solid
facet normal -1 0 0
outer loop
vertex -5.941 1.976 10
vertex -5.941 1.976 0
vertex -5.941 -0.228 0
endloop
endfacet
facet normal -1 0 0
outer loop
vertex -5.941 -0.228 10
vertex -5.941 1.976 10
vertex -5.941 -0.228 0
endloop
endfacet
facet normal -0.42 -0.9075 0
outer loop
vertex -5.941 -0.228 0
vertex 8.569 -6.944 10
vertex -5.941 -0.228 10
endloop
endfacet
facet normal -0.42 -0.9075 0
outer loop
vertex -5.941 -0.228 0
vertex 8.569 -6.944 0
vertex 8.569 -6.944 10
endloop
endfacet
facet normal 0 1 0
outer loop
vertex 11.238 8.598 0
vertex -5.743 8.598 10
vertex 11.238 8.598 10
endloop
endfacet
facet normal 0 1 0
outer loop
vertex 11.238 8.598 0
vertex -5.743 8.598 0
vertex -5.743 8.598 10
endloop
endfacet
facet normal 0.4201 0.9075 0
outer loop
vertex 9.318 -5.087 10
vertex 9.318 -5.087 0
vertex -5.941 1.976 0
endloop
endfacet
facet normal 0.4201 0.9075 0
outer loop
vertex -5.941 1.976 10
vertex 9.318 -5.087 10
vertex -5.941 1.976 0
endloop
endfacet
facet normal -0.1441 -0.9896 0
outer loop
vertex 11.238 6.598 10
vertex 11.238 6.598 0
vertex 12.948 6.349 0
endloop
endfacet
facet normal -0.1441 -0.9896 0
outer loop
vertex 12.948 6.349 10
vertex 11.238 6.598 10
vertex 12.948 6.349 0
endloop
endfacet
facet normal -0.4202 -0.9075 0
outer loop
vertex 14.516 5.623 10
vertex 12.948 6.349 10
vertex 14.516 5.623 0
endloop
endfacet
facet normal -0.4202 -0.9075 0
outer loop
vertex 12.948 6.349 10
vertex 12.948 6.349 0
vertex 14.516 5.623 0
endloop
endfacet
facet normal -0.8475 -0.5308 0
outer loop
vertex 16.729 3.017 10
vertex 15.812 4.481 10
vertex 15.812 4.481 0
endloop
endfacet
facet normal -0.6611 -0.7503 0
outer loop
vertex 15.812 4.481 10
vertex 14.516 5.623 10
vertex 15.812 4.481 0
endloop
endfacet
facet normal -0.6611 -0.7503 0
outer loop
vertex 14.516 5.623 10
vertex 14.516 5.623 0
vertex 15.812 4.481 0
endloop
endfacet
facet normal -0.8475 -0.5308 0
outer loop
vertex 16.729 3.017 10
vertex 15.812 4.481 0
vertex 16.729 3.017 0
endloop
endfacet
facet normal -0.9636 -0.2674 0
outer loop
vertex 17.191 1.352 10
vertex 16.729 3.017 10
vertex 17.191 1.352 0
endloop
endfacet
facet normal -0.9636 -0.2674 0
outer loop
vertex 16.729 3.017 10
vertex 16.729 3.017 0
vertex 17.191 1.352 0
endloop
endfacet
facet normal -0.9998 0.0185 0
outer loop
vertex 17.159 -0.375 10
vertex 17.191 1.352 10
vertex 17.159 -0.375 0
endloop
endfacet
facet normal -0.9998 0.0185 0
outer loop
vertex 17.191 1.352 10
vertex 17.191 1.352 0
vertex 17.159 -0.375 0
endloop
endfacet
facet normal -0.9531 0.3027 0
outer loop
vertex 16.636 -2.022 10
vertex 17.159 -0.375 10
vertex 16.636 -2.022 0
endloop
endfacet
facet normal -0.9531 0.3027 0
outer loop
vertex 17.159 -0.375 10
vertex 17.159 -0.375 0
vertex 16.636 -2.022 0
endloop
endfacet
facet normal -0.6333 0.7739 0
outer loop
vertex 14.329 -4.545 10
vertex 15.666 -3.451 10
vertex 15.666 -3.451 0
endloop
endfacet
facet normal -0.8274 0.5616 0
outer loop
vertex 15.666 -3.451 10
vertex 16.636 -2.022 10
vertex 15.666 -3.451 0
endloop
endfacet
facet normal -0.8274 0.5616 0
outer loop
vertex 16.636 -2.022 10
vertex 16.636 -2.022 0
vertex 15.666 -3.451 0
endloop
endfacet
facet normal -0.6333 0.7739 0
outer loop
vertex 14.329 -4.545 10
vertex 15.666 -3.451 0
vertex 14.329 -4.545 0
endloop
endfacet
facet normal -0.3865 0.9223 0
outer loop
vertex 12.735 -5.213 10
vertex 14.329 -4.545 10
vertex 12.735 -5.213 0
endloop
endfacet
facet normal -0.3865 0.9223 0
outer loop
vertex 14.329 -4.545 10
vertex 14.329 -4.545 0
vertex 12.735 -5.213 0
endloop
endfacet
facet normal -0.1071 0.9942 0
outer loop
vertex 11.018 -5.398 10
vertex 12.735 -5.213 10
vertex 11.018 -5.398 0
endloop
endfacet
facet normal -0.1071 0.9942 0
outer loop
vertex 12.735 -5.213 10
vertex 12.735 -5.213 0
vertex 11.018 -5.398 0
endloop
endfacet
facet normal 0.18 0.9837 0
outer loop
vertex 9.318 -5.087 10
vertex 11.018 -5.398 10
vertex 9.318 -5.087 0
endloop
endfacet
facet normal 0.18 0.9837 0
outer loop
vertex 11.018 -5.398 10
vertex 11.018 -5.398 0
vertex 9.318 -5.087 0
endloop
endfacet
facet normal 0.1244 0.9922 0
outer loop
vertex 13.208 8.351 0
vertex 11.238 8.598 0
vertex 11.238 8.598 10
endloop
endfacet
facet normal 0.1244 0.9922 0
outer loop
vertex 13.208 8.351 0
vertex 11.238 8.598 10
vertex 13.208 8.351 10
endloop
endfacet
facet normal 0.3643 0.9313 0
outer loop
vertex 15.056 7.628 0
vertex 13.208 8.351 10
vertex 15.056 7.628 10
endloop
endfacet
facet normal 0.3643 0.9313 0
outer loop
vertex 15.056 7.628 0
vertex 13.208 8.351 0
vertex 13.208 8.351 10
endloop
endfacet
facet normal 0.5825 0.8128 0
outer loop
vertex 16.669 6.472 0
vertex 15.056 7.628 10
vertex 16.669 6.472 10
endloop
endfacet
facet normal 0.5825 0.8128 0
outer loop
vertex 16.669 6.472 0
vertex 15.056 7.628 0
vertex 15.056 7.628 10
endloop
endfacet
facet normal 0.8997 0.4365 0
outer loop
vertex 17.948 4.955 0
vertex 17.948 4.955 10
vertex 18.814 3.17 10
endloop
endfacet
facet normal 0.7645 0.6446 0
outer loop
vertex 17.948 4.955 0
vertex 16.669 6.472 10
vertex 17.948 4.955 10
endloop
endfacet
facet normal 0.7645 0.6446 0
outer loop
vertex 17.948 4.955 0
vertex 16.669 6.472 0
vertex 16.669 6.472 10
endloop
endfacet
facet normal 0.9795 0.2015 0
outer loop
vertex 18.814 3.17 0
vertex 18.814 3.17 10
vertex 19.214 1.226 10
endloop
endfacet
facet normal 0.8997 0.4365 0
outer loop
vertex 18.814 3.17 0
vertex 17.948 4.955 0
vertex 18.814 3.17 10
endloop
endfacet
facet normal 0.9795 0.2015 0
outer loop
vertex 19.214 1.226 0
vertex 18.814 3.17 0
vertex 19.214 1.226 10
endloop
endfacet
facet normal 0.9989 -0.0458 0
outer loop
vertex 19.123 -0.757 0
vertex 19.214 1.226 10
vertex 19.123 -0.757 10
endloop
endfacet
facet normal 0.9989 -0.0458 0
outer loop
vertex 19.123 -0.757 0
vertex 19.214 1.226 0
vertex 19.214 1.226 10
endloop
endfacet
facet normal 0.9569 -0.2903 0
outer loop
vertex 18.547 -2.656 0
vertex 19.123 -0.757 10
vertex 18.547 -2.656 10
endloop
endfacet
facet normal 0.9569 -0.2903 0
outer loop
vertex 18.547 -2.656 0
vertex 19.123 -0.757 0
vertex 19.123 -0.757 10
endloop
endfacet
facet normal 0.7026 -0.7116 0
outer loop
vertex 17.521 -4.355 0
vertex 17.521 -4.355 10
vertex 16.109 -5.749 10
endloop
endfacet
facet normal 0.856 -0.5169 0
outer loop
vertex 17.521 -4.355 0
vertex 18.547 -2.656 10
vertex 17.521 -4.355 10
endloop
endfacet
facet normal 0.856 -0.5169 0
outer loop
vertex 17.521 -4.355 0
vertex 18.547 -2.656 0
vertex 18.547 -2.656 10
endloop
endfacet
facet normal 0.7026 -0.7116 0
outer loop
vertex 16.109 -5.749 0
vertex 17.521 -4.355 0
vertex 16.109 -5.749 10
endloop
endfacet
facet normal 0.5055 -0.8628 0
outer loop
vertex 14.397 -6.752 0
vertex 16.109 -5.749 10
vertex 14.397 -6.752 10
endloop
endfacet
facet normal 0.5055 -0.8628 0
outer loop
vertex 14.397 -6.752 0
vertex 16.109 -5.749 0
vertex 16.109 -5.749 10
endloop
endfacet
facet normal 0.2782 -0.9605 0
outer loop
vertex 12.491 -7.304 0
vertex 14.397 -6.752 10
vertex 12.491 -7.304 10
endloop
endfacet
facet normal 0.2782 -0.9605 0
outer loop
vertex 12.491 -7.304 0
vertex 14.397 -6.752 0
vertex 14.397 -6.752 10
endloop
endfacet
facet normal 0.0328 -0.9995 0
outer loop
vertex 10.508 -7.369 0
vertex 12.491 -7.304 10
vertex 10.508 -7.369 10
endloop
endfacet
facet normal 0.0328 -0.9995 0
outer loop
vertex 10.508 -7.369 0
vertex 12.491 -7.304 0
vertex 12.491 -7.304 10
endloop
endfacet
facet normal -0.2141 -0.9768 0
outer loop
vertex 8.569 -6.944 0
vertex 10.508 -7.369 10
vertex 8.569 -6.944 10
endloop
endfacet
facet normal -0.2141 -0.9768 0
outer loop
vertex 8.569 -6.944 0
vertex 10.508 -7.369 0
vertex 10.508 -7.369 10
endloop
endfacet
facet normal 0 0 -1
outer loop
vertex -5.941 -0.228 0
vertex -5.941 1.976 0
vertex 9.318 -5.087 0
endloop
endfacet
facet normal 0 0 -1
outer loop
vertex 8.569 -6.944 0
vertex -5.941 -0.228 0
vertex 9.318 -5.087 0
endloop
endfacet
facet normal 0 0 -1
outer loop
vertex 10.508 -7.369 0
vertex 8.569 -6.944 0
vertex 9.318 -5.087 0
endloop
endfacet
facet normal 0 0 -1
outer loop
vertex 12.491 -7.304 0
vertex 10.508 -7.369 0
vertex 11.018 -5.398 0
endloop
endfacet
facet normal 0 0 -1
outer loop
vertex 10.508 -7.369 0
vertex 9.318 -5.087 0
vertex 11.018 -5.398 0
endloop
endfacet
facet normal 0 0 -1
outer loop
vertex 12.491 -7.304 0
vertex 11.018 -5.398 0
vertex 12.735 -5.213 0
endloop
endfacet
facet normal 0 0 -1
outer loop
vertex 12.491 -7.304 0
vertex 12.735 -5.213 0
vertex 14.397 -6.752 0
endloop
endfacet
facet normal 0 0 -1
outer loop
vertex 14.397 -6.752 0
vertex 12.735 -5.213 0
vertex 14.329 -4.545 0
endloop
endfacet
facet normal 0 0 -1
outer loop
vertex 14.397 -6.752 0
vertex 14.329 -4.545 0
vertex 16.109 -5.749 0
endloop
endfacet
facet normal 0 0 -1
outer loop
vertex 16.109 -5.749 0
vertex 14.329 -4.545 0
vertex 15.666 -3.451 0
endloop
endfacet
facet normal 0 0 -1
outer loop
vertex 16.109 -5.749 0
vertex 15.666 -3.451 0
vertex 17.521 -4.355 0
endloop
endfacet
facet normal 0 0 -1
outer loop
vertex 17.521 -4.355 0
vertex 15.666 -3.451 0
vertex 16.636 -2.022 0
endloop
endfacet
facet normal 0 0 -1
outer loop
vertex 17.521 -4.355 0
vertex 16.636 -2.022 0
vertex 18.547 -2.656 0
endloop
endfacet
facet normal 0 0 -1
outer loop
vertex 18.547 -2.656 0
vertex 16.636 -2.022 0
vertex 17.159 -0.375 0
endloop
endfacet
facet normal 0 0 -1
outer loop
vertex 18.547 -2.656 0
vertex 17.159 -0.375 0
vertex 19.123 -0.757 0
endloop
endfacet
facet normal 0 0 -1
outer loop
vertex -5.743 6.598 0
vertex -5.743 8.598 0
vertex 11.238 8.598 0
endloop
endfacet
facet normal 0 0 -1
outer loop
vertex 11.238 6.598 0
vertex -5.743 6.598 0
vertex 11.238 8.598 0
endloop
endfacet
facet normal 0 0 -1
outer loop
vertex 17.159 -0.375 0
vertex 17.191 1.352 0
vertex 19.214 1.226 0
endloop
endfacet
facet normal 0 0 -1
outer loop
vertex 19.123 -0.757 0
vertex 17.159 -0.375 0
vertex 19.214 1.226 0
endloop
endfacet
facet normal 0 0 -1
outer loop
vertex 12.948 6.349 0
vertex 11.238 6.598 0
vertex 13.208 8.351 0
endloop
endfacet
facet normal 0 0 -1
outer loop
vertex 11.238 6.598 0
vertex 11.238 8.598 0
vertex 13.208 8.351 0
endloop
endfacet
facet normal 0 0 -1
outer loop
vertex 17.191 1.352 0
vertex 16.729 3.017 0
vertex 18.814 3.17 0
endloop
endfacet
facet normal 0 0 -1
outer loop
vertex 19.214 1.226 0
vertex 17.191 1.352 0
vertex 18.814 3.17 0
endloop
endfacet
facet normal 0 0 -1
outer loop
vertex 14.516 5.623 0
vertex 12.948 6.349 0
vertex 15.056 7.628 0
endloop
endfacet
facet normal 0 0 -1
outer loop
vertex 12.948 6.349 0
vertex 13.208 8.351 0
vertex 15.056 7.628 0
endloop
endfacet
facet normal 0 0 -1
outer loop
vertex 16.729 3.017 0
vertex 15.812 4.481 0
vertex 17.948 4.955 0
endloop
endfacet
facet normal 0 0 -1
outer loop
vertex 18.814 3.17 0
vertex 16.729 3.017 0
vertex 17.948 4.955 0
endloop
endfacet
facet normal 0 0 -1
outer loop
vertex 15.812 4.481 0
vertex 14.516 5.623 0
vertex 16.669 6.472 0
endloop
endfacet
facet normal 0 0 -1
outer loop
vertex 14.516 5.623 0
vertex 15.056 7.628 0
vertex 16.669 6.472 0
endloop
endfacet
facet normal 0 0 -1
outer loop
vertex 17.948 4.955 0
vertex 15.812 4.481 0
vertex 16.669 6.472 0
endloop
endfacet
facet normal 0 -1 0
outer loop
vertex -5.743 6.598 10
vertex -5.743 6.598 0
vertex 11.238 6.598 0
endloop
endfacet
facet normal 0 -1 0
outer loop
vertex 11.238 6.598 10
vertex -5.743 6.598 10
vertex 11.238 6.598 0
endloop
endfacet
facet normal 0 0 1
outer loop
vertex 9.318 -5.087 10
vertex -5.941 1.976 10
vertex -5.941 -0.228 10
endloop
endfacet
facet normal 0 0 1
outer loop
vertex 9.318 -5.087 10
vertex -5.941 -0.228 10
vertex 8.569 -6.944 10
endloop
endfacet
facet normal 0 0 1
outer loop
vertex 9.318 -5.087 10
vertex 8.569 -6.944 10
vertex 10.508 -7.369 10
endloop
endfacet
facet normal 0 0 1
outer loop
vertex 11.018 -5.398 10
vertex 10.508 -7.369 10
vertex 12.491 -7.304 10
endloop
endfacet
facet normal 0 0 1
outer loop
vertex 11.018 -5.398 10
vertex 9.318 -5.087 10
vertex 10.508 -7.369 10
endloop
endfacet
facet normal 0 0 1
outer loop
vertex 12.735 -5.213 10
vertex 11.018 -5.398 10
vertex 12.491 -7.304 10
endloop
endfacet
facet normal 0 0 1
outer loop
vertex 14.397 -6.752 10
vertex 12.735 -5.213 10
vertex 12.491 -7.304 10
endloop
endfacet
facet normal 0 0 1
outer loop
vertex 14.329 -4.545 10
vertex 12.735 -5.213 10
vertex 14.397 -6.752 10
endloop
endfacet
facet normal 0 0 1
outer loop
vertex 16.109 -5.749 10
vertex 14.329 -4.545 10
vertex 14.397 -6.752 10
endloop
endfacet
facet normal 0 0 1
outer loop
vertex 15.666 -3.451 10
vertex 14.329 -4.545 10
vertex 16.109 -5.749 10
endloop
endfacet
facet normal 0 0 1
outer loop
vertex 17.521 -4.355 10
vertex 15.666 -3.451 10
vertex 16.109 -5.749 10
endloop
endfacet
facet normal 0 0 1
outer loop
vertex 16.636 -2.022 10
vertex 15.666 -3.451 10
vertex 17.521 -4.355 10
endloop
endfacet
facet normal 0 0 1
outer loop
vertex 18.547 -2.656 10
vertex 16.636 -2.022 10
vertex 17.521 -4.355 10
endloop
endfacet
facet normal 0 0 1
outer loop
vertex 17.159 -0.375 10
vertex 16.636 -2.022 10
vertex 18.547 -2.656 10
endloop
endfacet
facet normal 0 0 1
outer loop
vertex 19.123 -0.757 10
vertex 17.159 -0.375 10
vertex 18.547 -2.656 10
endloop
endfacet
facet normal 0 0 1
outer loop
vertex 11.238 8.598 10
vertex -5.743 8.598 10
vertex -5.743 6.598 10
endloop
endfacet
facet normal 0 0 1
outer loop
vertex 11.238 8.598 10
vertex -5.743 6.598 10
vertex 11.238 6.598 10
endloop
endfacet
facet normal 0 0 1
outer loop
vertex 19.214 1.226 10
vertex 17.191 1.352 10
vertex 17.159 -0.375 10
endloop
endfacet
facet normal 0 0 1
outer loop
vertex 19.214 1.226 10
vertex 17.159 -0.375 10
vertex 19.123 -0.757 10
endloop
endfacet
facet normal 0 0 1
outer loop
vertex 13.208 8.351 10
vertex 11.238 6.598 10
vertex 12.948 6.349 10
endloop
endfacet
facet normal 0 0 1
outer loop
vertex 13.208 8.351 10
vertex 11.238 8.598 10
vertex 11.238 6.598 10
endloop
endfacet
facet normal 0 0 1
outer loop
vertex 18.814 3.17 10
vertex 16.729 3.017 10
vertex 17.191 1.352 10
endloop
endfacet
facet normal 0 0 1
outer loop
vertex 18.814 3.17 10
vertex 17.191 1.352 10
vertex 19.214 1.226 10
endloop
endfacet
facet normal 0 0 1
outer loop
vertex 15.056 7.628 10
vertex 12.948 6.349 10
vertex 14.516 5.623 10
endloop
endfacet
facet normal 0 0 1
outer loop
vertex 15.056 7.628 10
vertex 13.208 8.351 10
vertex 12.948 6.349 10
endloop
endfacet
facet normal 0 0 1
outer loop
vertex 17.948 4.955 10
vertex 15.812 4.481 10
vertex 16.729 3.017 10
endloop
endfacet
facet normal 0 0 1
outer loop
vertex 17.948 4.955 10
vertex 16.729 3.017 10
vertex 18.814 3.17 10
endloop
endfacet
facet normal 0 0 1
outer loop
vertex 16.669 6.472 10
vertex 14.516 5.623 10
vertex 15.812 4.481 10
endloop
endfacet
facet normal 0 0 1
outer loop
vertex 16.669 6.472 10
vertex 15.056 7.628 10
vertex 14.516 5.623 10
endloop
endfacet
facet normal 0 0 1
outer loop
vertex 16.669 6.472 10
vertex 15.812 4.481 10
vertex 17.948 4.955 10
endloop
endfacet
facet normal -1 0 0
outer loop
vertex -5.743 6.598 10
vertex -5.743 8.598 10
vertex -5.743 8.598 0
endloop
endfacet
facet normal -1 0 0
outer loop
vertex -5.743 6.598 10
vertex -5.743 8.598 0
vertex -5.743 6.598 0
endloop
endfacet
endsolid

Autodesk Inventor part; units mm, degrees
ref_plane "YZ Plane" through (0, 0, 0) normal (1, 0, 0) x (0, 1, 0)
ref_plane "XZ Plane" through (0, 0, 0) normal (0, 1, 0) x (-1, 0, 0)
ref_plane "XY Plane" through (0, 0, 0) normal (0, 0, 1) x (1, 0, 0)
sketch "Sketch1" plane through (0, 0, 0) normal (0, 0, 1) x (1, 0, 0)
  circle A0 centre (-0.2626, 0.8226) radius 5.775
  line L0 (-5.743, 8.5976) -> (11.2384, 8.5976)
  arc A1 (8.5691, -6.944) -> (11.2384, 8.5976) centre (11.2384, 0.5976) ccw
  line L1 (8.5691, -6.944) -> (-5.9413, -0.2275)
  line L2 (-5.743, 6.5976) -> (11.2384, 6.5976)
  arc A2 (9.3184, -5.0869) -> (11.2384, 6.5976) centre (11.2384, 0.5976) ccw
  line L3 (9.3184, -5.0869) -> (-5.9413, 1.9763)
  line L4 (-5.743, 8.5976) -> (-5.743, 6.5976)
  line L5 (-5.9413, 1.9763) -> (-5.9413, -0.2275)
  point P0 (0, 0)
  dimension "d6" = 11.55
  dimension "d0" = 6
  dimension "d2" = 2
  dimension "d3" = 90
extrude "Extrusion1" add sketch "Sketch1" along normal blind 10 contours L2 L4 L0 A1 L1 A0 L3 A2 | A0 L1 L5 L3 | A0 L5 L3
properties part number "01_Laser_Clamp_OnOffSwitch"
